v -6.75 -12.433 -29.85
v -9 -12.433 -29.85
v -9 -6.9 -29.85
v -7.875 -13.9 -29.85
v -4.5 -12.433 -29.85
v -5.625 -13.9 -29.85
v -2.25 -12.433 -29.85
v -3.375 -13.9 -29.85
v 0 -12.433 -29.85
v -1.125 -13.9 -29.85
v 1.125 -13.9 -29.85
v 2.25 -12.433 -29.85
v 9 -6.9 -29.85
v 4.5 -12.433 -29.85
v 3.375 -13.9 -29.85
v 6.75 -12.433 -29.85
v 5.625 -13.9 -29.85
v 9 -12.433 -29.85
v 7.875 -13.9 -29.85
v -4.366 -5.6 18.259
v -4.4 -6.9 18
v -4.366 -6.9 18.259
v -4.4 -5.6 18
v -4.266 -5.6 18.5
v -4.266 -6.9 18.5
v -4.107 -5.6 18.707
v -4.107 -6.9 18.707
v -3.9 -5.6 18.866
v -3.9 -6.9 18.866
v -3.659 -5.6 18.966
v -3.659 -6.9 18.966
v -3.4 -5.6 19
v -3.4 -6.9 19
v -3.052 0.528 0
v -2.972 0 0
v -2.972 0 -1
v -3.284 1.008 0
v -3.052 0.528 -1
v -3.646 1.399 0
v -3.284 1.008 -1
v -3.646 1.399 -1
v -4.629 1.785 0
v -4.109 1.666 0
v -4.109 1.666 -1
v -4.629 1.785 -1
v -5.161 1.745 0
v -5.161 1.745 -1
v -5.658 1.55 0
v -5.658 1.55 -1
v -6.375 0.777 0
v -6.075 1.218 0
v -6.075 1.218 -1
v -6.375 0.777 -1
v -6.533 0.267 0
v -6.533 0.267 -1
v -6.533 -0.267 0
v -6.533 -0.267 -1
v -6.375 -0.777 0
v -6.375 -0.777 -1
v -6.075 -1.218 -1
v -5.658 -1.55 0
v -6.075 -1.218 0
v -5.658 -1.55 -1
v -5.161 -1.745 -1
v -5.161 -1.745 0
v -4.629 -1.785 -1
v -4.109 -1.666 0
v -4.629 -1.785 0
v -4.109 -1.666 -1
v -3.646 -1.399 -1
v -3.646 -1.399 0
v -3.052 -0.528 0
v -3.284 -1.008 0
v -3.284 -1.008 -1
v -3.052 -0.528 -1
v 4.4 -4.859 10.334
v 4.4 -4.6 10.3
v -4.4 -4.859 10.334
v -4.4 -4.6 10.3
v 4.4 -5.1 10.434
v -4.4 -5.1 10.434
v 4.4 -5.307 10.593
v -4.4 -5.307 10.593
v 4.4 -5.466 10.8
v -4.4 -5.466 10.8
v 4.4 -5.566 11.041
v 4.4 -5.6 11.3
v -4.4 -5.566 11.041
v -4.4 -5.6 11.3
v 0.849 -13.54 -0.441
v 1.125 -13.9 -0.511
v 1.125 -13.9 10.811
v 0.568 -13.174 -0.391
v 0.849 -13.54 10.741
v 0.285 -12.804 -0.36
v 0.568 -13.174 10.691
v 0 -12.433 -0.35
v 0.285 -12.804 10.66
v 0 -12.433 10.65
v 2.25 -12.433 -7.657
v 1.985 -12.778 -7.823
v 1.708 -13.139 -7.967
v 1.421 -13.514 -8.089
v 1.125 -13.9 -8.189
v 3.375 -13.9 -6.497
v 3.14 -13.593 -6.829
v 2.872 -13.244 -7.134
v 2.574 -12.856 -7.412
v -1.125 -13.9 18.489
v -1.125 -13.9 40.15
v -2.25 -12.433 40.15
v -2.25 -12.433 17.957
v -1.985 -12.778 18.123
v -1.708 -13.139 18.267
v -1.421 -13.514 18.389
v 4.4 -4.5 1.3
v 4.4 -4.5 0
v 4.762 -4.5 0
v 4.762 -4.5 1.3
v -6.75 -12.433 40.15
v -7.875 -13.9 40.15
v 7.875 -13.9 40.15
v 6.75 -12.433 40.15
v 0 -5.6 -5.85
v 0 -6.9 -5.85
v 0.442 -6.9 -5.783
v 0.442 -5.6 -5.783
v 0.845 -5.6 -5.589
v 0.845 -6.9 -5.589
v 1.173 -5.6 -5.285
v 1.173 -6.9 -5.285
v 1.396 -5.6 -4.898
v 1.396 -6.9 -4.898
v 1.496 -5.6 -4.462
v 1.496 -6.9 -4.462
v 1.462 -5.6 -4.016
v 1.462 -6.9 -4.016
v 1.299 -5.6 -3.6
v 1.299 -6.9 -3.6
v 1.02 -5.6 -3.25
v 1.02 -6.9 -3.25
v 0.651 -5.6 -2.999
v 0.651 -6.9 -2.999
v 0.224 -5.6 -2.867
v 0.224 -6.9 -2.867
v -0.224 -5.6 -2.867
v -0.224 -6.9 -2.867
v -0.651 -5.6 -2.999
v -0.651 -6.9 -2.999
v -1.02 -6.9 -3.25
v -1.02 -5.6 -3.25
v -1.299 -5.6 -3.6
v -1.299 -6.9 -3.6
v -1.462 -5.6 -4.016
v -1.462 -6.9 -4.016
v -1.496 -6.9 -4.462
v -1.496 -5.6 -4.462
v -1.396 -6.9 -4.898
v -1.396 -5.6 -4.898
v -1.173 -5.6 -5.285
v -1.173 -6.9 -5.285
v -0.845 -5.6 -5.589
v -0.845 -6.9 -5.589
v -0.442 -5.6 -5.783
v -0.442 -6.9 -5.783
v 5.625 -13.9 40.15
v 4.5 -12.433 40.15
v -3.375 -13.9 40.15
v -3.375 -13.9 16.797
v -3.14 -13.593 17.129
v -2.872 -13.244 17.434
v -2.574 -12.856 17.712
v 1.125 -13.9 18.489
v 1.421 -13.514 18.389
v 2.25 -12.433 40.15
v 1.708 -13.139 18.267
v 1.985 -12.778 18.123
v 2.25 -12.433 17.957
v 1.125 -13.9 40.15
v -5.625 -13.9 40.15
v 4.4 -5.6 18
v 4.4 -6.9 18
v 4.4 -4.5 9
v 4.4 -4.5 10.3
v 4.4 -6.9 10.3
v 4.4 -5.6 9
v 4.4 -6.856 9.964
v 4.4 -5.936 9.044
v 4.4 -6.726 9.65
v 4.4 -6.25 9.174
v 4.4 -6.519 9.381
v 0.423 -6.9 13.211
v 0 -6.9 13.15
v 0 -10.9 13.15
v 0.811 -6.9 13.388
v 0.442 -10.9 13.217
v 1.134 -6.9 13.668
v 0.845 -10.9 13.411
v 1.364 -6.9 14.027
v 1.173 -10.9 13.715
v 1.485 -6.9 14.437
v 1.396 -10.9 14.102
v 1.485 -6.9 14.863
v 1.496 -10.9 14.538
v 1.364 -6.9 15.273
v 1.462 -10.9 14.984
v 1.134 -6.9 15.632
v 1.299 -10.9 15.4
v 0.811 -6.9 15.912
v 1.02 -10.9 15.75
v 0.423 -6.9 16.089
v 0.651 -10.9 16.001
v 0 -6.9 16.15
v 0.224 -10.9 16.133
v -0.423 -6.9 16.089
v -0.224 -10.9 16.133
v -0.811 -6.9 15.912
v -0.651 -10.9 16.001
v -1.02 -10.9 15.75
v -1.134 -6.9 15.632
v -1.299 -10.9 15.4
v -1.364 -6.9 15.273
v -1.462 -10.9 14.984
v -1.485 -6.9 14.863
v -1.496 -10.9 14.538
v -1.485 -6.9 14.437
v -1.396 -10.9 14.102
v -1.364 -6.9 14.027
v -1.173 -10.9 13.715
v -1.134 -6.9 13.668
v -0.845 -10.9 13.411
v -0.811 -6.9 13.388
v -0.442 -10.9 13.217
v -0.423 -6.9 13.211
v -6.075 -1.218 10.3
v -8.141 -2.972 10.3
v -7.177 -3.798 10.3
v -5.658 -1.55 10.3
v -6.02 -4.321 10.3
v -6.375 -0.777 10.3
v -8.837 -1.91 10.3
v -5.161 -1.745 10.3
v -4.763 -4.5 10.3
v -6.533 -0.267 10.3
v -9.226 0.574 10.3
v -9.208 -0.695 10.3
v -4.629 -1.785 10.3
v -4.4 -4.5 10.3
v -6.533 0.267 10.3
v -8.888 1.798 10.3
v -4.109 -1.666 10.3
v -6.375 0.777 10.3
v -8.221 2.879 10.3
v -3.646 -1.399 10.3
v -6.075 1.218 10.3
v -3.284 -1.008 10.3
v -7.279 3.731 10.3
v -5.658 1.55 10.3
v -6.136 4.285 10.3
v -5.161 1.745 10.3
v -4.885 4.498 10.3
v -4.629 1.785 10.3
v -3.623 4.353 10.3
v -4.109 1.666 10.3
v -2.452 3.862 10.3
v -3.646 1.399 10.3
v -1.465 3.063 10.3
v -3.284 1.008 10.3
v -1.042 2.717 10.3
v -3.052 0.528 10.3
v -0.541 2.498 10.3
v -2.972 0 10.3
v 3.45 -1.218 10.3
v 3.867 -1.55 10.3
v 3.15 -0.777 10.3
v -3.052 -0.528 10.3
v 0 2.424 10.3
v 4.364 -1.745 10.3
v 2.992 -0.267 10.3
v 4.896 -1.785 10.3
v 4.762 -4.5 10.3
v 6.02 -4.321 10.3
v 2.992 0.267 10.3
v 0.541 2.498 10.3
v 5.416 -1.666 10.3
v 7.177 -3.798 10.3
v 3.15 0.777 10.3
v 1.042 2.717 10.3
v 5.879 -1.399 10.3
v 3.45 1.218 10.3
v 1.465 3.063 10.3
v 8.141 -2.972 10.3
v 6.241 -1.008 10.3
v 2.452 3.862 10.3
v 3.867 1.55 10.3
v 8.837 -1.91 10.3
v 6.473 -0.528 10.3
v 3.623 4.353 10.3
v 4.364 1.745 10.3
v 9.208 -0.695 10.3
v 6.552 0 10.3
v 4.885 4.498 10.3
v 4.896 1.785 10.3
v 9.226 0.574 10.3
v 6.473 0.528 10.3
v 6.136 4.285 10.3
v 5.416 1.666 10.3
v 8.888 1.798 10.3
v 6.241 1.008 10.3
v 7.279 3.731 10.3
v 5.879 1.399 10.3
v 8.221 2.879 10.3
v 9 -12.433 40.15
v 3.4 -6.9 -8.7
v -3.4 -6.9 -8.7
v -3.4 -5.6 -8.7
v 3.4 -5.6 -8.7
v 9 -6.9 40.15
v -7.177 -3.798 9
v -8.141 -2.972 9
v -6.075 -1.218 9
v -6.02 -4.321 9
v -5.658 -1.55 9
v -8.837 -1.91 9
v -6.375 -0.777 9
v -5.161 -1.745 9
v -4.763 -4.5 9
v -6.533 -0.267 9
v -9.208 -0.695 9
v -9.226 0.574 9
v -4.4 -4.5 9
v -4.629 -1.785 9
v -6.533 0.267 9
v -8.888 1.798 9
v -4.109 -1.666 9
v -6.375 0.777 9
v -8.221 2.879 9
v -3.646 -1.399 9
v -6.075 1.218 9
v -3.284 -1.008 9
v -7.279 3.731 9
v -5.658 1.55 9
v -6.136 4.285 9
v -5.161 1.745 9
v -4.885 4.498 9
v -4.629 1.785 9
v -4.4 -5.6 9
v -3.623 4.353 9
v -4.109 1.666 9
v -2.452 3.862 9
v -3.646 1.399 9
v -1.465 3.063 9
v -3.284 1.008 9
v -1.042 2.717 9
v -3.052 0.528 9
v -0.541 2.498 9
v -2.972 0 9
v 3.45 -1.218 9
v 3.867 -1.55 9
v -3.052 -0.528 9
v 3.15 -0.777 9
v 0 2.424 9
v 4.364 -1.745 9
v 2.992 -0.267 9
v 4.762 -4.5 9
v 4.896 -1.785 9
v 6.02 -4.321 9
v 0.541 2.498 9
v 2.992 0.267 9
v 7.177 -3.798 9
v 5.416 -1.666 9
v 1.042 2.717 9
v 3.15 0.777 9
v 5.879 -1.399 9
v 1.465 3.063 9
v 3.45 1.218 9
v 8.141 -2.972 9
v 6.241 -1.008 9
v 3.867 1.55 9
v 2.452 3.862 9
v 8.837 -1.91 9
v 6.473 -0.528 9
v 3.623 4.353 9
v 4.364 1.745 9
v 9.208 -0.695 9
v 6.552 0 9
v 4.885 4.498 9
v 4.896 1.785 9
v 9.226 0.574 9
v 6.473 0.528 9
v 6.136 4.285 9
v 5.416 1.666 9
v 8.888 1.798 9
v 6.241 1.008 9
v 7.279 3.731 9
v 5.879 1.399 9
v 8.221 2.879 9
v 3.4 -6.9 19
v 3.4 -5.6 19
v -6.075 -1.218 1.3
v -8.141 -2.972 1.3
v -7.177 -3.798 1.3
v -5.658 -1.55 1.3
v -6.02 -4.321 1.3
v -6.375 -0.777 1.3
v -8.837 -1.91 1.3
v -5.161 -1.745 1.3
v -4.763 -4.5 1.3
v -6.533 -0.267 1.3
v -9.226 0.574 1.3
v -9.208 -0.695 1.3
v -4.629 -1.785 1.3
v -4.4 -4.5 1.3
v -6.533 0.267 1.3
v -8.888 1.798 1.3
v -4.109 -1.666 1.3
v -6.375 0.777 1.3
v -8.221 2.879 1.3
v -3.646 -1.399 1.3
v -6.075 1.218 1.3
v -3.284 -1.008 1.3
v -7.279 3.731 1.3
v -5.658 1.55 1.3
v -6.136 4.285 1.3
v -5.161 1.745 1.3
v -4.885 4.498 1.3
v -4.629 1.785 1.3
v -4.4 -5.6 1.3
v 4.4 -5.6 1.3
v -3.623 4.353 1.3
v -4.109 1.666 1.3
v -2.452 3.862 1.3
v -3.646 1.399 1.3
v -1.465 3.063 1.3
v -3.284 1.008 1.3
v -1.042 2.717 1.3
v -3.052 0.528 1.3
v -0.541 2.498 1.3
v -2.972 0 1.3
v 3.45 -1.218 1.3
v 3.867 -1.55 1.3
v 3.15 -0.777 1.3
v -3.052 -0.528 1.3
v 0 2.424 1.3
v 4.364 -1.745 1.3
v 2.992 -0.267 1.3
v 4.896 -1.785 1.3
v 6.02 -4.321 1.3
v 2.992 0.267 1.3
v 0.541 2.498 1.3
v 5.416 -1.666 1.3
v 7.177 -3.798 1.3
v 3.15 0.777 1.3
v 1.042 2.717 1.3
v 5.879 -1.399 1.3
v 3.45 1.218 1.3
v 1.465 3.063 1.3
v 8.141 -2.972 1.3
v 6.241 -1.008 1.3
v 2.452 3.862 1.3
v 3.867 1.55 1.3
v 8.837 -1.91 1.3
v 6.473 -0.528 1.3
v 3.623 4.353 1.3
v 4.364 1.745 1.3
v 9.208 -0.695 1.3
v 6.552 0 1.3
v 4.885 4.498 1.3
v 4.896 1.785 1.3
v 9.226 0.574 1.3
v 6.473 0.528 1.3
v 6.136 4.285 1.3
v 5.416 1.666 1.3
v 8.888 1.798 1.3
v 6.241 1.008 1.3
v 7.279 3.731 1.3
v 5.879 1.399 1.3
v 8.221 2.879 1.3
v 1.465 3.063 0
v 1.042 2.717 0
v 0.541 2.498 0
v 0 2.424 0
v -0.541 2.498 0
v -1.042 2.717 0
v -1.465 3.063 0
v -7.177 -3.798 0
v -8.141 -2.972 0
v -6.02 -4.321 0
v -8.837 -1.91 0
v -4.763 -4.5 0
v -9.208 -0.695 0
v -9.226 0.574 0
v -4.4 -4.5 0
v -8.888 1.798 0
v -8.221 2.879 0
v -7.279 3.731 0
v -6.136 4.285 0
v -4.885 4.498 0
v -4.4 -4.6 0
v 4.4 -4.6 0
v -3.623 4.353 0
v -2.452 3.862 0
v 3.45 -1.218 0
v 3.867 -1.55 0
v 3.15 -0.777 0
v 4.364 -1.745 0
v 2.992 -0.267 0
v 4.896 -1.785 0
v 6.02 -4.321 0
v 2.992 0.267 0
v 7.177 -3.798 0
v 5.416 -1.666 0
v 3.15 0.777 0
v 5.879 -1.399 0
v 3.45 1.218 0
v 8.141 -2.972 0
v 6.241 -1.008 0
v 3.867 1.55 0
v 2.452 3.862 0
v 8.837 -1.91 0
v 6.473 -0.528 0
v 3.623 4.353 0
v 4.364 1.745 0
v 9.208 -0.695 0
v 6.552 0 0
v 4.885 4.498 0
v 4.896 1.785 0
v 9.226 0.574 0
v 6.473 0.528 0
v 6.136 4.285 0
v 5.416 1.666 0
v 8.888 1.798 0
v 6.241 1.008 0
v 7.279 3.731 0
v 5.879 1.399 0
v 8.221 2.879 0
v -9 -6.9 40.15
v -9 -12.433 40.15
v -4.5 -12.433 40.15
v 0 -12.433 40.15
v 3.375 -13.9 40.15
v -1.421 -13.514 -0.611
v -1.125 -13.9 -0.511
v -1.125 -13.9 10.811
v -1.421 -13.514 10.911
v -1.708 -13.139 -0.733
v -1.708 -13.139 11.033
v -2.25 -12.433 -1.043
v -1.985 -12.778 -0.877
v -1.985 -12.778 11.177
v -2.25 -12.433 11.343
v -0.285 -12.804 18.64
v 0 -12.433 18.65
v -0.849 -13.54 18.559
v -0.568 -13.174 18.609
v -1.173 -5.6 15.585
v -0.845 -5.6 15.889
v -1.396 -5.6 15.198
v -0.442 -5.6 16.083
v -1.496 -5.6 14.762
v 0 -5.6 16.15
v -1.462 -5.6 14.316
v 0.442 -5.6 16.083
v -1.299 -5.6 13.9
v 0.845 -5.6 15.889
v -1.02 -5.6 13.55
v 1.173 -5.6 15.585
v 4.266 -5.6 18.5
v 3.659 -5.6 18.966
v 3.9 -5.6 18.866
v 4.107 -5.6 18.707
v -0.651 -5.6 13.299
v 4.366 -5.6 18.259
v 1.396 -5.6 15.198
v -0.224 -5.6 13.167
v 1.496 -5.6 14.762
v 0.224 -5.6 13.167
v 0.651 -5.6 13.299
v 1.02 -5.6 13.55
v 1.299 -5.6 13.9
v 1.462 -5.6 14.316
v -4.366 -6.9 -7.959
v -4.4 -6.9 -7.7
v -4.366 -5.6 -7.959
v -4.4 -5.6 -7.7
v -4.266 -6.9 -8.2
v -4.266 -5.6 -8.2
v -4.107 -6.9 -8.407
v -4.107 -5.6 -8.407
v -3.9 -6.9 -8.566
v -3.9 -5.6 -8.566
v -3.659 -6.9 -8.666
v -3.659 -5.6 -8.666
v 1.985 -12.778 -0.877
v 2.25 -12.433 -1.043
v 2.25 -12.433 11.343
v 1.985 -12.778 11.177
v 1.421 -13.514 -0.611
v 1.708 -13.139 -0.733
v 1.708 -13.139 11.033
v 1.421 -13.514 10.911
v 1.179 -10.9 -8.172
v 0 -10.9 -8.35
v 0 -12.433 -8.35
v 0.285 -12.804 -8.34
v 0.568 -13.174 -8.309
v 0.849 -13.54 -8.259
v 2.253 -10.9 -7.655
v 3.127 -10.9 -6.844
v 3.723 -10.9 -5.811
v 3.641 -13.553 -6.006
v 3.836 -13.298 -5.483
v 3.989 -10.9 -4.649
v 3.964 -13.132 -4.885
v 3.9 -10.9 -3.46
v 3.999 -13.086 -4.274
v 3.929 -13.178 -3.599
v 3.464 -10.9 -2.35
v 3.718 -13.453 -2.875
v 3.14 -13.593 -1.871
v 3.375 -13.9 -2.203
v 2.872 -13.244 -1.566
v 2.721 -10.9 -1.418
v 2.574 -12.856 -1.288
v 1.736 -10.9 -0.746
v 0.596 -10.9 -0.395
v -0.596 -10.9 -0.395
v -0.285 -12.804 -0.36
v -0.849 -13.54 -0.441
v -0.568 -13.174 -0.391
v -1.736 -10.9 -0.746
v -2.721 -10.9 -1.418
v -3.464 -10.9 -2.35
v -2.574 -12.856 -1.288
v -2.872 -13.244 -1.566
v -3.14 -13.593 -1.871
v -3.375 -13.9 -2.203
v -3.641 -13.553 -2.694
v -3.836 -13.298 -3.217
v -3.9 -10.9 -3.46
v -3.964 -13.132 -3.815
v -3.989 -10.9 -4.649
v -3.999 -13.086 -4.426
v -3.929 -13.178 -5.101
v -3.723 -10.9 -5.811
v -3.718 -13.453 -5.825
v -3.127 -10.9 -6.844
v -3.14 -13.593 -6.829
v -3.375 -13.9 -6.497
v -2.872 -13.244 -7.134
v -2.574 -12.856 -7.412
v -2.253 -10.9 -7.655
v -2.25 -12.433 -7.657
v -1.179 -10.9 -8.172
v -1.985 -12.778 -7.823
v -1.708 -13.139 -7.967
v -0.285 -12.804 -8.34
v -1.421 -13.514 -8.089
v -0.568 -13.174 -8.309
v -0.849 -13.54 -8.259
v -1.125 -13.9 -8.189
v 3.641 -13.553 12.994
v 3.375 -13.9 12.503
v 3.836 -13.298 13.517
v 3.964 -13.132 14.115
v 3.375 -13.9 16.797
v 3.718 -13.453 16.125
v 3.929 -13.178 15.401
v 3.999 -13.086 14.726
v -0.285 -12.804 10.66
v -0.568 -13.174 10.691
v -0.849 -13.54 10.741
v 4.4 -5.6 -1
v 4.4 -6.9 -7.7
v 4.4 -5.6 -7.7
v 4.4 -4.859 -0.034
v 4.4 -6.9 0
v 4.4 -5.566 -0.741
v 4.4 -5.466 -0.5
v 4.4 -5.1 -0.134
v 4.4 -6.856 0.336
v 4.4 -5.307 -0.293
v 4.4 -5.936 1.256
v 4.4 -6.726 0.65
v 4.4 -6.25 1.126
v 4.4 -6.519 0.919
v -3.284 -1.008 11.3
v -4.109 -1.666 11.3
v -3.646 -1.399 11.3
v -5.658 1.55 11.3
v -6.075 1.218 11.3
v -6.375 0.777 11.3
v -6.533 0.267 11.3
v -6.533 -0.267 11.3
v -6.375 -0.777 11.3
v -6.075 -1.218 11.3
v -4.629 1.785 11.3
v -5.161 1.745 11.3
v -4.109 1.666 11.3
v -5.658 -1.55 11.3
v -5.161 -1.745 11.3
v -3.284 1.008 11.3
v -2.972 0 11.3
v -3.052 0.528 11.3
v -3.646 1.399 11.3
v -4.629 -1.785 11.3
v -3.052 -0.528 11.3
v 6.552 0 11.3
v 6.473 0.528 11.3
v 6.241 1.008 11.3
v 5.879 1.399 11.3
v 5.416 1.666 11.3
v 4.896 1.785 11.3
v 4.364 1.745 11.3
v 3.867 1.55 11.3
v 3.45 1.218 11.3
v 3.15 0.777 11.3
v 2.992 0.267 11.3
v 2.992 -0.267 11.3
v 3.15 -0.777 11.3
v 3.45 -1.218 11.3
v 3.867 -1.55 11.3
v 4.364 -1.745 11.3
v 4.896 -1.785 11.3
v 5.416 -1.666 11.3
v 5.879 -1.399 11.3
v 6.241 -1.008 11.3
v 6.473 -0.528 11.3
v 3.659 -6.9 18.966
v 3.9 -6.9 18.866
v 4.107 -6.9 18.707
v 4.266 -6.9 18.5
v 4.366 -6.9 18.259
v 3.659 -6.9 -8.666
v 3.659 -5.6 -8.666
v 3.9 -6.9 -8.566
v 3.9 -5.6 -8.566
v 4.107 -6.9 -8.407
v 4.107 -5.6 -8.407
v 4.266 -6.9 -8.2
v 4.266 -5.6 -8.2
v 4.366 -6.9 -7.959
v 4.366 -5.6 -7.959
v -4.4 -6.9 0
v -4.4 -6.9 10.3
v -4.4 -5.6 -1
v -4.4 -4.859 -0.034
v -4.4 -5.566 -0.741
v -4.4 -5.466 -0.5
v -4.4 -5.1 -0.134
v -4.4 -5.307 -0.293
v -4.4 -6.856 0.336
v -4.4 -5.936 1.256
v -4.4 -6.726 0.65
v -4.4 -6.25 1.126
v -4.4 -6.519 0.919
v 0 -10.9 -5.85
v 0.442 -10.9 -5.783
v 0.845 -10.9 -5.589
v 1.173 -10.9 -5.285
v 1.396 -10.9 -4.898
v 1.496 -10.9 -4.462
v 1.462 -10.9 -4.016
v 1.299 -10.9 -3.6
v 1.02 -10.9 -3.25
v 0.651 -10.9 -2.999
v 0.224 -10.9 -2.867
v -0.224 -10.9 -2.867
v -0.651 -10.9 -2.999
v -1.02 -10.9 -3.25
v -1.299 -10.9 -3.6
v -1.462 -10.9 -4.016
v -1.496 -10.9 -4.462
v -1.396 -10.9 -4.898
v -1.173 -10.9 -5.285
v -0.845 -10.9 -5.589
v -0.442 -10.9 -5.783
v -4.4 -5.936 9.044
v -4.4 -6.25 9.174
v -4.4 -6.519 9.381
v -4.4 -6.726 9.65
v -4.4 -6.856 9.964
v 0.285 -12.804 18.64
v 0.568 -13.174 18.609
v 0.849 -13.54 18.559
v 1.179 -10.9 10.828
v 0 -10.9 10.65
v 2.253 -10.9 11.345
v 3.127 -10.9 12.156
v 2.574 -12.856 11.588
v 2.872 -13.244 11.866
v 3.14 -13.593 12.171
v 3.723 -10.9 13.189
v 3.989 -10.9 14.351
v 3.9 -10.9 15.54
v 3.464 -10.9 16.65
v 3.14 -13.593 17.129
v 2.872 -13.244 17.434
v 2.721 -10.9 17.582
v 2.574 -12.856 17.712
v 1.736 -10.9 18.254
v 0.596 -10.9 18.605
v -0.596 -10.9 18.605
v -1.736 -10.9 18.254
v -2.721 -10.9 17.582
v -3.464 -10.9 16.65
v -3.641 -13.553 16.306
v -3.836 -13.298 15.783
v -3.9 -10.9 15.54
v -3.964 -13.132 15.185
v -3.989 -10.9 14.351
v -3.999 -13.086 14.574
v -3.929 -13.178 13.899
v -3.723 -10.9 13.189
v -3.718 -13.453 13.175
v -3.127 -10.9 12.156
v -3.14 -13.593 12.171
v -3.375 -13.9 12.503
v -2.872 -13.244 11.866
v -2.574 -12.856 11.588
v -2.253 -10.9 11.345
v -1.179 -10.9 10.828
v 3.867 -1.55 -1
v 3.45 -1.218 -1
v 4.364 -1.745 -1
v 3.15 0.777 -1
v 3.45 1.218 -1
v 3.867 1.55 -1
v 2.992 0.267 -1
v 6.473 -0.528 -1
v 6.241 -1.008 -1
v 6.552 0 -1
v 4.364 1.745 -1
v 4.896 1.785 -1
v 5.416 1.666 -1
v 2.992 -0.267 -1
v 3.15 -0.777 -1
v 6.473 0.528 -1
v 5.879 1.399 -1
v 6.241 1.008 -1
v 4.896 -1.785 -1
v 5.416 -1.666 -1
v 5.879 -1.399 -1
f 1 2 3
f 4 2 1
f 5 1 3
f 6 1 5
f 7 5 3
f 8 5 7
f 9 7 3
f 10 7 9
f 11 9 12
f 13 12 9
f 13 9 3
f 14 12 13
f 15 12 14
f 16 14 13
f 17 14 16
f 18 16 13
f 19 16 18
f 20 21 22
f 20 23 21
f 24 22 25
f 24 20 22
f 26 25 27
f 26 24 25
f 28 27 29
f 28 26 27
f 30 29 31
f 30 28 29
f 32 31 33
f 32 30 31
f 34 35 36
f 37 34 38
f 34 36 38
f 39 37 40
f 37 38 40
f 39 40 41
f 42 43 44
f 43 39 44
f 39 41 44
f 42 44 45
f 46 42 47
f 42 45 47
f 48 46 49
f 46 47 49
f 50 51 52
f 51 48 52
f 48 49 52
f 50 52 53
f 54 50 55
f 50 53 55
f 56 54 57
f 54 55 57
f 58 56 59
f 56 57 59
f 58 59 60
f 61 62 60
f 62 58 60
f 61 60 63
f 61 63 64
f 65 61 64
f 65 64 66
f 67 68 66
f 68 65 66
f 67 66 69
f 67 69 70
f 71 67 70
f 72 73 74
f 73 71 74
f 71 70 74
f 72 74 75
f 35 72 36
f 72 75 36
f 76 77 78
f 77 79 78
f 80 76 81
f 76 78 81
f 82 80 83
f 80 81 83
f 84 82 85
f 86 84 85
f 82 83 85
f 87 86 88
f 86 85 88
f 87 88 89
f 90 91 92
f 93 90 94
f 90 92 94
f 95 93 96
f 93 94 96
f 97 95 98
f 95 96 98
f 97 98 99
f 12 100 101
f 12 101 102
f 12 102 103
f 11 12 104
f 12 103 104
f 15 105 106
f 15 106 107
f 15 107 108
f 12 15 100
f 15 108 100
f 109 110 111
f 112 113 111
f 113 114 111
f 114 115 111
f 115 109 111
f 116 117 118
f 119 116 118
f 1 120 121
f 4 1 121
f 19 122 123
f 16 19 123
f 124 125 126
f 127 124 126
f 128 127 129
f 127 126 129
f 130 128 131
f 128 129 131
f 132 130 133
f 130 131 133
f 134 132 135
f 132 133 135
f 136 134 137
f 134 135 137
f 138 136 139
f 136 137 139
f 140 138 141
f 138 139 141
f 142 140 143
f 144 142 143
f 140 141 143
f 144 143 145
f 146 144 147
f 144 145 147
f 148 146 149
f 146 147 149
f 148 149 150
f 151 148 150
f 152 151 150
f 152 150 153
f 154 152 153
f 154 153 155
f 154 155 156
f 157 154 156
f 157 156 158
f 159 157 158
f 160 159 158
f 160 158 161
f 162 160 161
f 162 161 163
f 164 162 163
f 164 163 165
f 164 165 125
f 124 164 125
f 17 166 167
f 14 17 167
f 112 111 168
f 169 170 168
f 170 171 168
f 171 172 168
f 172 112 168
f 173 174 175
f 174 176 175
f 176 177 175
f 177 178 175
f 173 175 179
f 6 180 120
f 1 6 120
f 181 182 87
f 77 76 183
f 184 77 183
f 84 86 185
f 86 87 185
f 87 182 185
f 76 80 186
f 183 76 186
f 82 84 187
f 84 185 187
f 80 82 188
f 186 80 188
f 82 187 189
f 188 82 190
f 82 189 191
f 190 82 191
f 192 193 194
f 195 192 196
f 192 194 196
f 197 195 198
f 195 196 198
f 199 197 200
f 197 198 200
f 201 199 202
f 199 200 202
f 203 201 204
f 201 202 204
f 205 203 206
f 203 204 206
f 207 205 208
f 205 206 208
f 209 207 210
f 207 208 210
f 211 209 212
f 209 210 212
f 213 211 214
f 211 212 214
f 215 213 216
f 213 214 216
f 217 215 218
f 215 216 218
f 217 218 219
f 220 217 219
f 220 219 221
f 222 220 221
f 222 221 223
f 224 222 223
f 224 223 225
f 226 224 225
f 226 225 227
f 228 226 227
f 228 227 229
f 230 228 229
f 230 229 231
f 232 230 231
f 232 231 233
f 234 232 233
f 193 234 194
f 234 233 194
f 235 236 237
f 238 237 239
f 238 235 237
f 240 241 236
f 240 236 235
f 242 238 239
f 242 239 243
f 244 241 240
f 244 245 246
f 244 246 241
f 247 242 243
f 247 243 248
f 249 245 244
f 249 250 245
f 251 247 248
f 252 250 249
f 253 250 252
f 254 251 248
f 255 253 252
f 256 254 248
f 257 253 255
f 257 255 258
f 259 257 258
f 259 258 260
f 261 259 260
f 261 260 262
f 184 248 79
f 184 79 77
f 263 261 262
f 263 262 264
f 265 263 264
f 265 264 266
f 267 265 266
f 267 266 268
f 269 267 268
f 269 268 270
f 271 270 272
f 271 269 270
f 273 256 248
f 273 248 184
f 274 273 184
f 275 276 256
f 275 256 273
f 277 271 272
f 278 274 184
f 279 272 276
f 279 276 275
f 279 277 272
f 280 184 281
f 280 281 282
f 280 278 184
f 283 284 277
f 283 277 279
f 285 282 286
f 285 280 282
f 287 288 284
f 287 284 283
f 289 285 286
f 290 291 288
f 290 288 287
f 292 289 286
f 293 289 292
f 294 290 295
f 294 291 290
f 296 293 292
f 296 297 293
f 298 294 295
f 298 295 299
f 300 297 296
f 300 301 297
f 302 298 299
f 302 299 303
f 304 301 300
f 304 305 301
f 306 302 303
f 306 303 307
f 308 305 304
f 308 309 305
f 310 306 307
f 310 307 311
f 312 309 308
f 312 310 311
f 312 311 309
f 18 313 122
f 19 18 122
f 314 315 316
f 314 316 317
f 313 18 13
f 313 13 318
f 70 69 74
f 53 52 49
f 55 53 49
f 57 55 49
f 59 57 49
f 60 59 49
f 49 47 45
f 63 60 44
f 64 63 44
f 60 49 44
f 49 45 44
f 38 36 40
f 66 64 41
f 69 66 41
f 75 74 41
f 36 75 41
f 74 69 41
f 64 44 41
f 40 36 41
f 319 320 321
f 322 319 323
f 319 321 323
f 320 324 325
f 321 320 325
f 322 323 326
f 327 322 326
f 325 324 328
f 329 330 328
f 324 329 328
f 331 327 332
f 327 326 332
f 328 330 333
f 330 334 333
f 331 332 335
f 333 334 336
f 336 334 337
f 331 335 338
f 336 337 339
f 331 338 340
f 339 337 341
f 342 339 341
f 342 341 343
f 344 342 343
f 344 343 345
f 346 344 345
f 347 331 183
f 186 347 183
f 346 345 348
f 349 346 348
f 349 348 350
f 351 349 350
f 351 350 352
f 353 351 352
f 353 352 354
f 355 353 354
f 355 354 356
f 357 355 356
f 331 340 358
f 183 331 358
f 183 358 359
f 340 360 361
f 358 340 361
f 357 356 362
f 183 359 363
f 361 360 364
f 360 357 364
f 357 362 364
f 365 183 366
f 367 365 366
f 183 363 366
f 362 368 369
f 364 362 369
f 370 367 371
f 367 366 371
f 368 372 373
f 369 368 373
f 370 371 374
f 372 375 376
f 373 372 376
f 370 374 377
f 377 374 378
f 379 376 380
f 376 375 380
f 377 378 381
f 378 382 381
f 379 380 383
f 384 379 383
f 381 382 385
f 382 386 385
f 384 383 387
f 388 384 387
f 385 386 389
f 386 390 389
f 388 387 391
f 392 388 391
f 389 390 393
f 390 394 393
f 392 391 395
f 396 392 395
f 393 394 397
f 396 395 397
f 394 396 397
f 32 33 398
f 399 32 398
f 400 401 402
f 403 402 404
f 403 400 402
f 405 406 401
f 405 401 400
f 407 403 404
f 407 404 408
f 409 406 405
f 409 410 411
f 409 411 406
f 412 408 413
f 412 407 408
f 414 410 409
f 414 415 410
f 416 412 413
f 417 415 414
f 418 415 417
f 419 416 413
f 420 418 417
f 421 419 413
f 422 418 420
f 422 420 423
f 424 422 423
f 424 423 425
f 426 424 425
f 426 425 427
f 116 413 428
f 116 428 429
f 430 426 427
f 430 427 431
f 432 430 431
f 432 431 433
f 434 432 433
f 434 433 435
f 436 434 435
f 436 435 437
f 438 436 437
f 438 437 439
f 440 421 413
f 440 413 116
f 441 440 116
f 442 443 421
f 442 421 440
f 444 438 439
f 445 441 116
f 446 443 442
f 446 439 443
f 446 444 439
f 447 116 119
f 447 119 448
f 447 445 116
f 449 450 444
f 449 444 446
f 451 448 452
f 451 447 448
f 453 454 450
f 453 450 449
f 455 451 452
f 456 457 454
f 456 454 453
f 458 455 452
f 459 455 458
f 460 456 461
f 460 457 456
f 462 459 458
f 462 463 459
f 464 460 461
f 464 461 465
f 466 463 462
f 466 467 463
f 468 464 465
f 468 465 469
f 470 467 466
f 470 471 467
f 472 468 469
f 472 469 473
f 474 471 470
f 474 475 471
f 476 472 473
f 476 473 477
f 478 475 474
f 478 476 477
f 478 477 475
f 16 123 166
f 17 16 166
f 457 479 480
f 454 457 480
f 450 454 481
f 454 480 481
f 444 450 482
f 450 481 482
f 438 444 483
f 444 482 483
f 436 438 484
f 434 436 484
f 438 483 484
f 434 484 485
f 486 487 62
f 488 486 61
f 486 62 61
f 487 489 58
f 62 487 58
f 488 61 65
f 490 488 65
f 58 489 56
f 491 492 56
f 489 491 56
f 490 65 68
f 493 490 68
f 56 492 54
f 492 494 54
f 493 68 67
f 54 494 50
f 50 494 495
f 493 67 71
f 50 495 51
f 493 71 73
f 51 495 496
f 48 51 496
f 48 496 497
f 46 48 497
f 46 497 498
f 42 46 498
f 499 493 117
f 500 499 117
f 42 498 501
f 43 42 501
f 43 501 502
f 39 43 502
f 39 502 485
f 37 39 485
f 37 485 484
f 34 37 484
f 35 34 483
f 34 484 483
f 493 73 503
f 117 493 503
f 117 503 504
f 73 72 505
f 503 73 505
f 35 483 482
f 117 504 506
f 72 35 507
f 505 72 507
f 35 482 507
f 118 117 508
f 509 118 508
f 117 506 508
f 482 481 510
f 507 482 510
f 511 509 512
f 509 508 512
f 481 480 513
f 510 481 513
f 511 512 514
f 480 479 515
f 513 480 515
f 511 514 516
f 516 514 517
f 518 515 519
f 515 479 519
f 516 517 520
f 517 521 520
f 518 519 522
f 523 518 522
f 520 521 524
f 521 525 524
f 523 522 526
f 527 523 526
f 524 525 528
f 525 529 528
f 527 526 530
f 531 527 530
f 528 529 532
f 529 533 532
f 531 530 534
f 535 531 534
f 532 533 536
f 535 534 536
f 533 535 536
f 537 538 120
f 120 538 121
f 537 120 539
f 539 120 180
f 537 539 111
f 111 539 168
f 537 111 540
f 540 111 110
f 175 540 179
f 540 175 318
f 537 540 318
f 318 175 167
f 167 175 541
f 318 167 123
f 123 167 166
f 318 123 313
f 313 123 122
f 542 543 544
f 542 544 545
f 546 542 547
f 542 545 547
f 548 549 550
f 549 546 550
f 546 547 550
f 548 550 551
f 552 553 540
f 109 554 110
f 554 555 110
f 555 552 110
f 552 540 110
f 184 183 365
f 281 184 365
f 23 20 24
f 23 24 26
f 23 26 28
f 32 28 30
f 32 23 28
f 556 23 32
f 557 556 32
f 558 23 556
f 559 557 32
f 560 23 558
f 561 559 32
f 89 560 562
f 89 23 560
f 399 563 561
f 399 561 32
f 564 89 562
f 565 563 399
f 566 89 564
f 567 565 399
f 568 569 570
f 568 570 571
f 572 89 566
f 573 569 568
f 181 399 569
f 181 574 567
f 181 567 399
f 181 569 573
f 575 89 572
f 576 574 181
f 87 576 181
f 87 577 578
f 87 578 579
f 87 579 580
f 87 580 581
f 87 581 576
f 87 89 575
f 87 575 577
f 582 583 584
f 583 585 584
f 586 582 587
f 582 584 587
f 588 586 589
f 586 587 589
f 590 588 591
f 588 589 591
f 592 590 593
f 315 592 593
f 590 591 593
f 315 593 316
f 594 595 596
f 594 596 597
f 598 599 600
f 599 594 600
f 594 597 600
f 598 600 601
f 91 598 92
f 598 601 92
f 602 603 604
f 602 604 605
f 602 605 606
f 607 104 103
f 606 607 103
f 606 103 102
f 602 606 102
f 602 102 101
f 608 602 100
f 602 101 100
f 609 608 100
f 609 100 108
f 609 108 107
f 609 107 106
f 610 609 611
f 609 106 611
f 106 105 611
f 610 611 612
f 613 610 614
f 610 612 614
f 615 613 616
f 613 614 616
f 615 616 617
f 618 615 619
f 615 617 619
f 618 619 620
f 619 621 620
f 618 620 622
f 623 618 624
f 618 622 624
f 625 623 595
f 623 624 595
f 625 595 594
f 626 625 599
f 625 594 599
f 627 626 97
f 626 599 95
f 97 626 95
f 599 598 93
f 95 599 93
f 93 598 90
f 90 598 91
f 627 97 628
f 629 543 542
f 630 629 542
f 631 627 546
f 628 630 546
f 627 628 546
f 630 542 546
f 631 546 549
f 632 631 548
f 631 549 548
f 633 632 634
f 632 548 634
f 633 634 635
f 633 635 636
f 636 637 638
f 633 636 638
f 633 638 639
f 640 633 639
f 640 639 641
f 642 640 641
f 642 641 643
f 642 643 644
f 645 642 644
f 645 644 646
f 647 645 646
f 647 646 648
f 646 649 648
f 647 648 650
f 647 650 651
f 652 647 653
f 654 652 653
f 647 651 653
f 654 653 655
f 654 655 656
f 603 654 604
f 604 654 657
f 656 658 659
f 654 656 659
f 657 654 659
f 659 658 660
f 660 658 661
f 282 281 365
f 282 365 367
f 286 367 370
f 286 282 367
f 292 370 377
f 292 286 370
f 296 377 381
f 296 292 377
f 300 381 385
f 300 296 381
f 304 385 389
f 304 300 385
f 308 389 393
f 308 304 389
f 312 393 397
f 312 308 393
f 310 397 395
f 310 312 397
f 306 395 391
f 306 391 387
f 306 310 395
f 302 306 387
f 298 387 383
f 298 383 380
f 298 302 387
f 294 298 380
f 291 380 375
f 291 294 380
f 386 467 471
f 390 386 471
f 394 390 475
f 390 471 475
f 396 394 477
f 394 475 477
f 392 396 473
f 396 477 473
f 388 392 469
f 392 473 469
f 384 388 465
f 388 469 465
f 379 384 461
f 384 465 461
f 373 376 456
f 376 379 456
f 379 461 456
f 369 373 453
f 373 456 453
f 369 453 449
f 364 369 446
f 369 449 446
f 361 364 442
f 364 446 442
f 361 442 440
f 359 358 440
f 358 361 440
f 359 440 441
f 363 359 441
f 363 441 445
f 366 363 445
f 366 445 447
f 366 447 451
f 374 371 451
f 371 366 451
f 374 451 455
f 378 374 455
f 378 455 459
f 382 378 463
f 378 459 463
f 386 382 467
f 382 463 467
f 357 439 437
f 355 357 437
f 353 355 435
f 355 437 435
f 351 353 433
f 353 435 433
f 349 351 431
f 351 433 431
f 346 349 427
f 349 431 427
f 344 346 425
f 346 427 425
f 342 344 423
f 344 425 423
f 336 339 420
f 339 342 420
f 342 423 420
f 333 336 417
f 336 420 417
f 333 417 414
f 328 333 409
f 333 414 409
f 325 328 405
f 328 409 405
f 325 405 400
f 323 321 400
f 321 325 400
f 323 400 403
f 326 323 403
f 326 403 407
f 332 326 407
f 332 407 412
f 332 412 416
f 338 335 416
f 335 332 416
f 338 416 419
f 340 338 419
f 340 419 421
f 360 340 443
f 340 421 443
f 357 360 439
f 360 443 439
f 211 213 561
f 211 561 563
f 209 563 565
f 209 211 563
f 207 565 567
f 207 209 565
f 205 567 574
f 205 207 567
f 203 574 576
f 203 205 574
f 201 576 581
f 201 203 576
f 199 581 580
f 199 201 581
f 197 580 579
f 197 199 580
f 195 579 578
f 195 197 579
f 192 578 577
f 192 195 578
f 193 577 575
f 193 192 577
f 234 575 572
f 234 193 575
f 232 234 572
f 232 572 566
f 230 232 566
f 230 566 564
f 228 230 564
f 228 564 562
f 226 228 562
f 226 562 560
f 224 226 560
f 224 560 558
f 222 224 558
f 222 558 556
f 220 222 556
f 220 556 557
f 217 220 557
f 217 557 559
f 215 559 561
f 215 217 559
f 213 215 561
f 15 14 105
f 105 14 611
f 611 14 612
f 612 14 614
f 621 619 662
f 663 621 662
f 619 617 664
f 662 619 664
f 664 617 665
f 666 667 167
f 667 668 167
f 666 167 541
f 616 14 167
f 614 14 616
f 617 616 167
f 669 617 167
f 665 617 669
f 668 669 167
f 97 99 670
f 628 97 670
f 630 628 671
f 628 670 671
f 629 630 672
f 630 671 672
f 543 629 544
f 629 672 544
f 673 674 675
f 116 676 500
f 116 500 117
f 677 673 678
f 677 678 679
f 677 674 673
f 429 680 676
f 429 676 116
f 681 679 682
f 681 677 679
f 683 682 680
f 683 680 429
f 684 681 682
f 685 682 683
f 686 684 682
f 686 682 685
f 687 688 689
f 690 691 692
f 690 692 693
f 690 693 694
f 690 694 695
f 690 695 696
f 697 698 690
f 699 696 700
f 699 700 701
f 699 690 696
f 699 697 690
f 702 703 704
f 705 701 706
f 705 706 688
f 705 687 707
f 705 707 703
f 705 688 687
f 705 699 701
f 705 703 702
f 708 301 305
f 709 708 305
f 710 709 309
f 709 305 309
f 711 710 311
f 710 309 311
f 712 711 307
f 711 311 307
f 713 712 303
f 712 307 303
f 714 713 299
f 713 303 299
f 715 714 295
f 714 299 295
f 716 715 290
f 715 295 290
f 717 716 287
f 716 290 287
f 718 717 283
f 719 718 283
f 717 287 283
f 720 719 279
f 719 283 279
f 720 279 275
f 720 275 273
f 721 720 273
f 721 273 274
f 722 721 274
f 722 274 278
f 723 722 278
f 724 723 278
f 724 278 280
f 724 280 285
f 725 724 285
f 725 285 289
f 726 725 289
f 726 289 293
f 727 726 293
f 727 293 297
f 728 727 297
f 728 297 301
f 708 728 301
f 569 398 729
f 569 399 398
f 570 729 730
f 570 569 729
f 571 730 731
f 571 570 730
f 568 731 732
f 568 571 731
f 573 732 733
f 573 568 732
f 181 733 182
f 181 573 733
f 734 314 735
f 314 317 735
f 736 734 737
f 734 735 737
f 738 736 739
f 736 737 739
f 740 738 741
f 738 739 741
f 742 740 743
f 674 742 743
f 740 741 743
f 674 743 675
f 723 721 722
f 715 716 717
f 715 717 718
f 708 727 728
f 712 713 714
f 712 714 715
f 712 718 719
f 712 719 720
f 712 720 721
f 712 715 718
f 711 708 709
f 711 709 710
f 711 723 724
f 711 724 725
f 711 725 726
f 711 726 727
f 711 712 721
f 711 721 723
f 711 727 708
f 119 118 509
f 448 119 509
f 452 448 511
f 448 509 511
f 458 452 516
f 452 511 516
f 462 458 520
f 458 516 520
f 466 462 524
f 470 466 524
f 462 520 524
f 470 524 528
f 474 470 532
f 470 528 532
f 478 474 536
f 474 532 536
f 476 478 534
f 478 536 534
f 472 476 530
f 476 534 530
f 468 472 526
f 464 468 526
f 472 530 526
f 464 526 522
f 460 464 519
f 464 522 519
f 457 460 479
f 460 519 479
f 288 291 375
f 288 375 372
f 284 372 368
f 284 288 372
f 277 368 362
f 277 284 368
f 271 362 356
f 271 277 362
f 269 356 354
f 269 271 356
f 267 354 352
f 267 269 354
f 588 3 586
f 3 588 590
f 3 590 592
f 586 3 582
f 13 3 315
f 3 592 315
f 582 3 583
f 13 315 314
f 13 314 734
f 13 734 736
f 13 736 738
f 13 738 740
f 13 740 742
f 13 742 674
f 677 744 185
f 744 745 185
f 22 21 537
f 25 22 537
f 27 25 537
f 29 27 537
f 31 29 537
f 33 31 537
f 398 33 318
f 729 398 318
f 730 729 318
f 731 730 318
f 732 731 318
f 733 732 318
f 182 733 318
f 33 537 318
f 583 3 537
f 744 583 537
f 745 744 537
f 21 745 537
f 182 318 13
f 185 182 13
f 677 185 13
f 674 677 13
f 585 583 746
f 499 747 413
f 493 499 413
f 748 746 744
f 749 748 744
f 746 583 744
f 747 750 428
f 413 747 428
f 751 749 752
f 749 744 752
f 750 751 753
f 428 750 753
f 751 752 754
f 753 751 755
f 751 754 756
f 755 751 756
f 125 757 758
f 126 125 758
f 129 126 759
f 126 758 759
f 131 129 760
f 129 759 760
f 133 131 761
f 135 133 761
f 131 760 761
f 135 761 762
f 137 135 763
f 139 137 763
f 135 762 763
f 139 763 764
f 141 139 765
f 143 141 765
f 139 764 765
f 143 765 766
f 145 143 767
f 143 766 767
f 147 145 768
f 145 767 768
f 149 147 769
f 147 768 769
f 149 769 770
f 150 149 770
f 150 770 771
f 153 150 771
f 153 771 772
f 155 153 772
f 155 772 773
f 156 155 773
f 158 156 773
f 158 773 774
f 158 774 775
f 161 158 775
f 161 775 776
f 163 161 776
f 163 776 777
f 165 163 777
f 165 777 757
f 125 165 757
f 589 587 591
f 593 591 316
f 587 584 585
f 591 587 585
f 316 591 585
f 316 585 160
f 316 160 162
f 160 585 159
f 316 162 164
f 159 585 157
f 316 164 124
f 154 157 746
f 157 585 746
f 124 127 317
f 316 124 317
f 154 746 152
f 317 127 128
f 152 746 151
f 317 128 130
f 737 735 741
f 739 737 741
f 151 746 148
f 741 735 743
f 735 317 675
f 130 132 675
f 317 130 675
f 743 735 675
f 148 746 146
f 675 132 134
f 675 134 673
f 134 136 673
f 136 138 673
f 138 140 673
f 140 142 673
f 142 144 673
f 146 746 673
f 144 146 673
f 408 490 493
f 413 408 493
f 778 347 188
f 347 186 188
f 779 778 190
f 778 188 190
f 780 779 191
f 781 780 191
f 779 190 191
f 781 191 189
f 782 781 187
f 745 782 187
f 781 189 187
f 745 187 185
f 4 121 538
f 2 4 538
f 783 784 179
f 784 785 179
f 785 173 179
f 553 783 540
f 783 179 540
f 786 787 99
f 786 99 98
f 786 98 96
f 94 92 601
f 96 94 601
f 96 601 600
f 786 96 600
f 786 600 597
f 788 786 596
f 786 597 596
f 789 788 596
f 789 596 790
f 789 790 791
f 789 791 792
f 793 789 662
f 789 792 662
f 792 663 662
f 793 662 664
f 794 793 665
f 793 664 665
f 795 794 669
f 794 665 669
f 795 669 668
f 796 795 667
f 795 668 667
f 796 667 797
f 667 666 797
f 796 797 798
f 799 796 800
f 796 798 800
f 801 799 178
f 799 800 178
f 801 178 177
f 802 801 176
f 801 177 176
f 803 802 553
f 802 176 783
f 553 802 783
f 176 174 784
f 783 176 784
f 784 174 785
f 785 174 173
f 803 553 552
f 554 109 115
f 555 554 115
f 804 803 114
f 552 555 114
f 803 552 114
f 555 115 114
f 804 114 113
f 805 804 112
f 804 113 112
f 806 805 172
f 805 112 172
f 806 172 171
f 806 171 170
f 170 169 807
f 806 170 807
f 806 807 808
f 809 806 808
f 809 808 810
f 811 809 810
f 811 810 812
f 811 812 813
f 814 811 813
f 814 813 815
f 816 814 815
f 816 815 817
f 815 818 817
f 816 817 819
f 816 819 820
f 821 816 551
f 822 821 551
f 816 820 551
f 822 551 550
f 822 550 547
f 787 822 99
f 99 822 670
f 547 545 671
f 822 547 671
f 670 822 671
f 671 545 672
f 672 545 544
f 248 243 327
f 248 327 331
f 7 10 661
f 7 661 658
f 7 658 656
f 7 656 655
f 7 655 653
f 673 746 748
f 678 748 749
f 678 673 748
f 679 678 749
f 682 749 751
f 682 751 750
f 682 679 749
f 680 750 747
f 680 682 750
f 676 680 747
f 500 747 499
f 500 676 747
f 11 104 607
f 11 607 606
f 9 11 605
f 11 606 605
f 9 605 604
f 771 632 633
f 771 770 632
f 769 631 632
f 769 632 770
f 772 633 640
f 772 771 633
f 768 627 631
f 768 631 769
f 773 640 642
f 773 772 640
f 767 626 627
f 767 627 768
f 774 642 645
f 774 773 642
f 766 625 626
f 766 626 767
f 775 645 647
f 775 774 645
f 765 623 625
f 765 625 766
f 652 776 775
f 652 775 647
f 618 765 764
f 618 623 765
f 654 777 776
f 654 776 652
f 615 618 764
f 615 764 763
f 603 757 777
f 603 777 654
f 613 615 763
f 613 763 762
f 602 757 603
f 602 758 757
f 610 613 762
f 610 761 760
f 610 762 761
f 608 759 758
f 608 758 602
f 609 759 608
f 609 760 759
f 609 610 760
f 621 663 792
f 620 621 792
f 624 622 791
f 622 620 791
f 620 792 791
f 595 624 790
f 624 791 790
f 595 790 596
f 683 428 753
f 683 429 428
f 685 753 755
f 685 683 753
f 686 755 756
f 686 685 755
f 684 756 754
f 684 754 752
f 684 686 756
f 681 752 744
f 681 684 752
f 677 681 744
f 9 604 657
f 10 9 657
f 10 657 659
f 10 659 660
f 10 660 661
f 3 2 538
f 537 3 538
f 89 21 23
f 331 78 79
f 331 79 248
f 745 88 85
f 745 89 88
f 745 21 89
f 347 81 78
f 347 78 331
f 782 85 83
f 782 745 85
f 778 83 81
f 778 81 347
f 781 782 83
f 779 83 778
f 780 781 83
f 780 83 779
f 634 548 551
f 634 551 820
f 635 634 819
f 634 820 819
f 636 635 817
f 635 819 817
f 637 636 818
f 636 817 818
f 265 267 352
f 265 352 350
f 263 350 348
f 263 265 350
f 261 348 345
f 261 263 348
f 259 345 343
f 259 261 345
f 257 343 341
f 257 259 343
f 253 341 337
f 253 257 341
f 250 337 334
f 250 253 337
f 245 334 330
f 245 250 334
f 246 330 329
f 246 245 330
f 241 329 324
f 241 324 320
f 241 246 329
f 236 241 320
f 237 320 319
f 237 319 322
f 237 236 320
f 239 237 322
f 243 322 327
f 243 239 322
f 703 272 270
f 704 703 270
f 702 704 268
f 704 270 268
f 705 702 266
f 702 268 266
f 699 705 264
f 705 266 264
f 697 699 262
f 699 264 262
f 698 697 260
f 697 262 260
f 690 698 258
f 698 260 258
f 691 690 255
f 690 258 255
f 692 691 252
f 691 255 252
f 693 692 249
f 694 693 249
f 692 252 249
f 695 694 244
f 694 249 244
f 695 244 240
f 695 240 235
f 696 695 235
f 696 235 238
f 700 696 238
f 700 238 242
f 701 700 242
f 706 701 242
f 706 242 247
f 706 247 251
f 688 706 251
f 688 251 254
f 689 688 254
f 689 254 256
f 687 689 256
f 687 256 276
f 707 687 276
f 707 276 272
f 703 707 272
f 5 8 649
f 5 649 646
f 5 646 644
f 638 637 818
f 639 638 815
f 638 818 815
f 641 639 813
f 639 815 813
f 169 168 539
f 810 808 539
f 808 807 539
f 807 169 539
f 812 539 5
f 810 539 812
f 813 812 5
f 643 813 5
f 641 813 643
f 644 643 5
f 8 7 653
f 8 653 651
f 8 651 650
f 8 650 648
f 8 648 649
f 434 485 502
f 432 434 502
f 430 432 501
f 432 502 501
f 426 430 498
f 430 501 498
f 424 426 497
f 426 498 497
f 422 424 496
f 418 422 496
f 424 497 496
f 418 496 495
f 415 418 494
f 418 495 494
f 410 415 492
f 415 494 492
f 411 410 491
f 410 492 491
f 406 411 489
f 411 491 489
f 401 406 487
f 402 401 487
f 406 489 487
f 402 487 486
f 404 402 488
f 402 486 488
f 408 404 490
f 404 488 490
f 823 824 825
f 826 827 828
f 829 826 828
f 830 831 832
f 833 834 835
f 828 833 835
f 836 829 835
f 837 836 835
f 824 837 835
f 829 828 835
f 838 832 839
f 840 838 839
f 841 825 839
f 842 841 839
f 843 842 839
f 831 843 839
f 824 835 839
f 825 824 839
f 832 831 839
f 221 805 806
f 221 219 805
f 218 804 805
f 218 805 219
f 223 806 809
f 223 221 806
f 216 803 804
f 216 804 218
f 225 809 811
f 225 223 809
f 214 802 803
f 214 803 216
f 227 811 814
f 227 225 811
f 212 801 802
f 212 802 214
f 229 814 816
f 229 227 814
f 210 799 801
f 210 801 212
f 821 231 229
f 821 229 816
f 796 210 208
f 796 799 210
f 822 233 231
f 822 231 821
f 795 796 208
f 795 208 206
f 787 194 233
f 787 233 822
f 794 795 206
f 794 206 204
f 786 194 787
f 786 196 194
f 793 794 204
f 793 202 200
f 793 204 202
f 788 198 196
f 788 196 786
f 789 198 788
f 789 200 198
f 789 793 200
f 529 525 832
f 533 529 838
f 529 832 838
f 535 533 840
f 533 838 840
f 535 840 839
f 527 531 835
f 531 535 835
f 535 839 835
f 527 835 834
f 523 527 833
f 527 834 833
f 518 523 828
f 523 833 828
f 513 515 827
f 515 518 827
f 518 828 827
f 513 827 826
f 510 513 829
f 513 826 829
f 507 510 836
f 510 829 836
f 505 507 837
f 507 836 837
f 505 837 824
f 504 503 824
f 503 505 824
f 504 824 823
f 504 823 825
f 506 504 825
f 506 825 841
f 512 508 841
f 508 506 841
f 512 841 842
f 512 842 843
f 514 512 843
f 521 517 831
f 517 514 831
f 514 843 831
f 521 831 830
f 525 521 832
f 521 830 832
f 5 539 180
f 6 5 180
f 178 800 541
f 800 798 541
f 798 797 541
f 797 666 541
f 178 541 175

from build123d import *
from build123d.topology import SkipClean

# Parameters (mm, degrees)
BOSS_EXTRUDE1_DEPTH      = 1.3
BOSS_EXTRUDE2_DEPTH      = 10
BOSS_EXTRUDE2_DEPTH_BACK = 2.3
SKETCH2_R                = 1.79
SKETCH4_W                = 8.8
SKETCH4_H                = 1.3
BOSS_EXTRUDE4_DEPTH      = 2.4
SKETCH3_W                = 8.8
SKETCH3_H                = 10
BOSS_EXTRUDE3_DEPTH      = 1.3
FILLET4_R                = 1.3
FILLET6_R                = 1
SKETCH5_R                = 1.5
CUT_EXTRUDE1_DEPTH       = 2.4
FILLET7_R                = 1
FILLET4_OF_MIRROR1_R     = 1.3
FILLET6_OF_MIRROR1_R     = 1
FILLET7_OF_MIRROR1_R     = 1
BOSS_EXTRUDE5_START      = 7
SKETCH6_W                = 18
SKETCH6_H                = 70
SKETCH6_R                = 1.5
BOSS_EXTRUDE5_DEPTH      = 7
SKETCH9_R                = 4
CUT_EXTRUDE3_DEPTH       = 3
CUT_EXTRUDE4_DEPTH       = 72.965296541


with BuildPart() as part:
    # Sketch1 → Boss-Extrude1 (new body)
    with BuildSketch(Plane.XY):
        with BuildLine():
            Line((-4.7625, -4.5), (4.7625, -4.5))
            ThreePointArc((4.7625, -4.5), (8.887505516, 1.798424168), (1.465384615, 3.062520227))
            ThreePointArc((1.465384615, 3.062520227), (0, 2.423640328), (-1.465384615, 3.062520227))
            ThreePointArc((-1.465384615, 3.062520227), (-8.887505516, 1.798424168), (-4.7625, -4.5))
        make_face()
    boss_extrude1 = extrude(amount=BOSS_EXTRUDE1_DEPTH)

    # Sketch2 → Boss-Extrude2 (add, two sides: drawn at the far end of the back side and taken through both)
    with BuildSketch(Plane.XY.offset(1.3).offset(-BOSS_EXTRUDE2_DEPTH_BACK)):
        with Locations((-4.7625, 0)):
            Circle(SKETCH2_R)
        with Locations((4.7625, 0)):
            Circle(SKETCH2_R)
    extrude(amount=BOSS_EXTRUDE2_DEPTH + BOSS_EXTRUDE2_DEPTH_BACK)

    # Sketch4 → Boss-Extrude4 (add)
    with BuildSketch(Plane.XZ.offset(4.5)):
        with Locations((0, 0.65)):
            Rectangle(SKETCH4_W, SKETCH4_H)
    boss_extrude4 = extrude(amount=BOSS_EXTRUDE4_DEPTH)

    # Sketch3 → Boss-Extrude3 (add)
    with BuildSketch(Plane.XZ.offset(6.9)):
        with Locations((0, -3.7)):
            Rectangle(SKETCH3_W, SKETCH3_H)
    boss_extrude3 = extrude(amount=-BOSS_EXTRUDE3_DEPTH)

    # Fillet4
    fillet4_edges = [part.edges().sort_by_distance(p)[0] for p in [
        (0, -6.9, 1.3),
    ]]
    fillet(fillet4_edges, radius=FILLET4_R)

    # Fillet6
    fillet6_edges = [part.edges().sort_by_distance(p)[0] for p in [
        (0, -5.6, 0),
    ]]
    fillet(fillet6_edges, radius=FILLET6_R)

    # Sketch5 → Cut-Extrude1 (cut)
    with BuildSketch(Plane.XZ.offset(6.9)):
        with Locations(Location((0, -4.35, 0), (0, 0, 270))):
            Circle(SKETCH5_R)
    cut_extrude1 = extrude(amount=-CUT_EXTRUDE1_DEPTH, mode=Mode.SUBTRACT)

    # Fillet7
    fillet7_edges = [part.edges().sort_by_distance(p)[0] for p in [
        (-4.4, -6.25, -8.7),
        (4.4, -6.25, -8.7),
    ]]
    fillet(fillet7_edges, radius=FILLET7_R)

    # Mirror1: Boss-Extrude1, Boss-Extrude4, Boss-Extrude3, Cut-Extrude1 across plane
    add(boss_extrude1.mirror(Plane(origin=(0, 0, 5.15), x_dir=(1, 0, 0), z_dir=(0, 0, -1))))
    add(boss_extrude4.mirror(Plane(origin=(0, 0, 5.15), x_dir=(1, 0, 0), z_dir=(0, 0, -1))))
    add(boss_extrude3.mirror(Plane(origin=(0, 0, 5.15), x_dir=(1, 0, 0), z_dir=(0, 0, -1))))
    add(cut_extrude1.mirror(Plane(origin=(0, 0, 5.15), x_dir=(1, 0, 0), z_dir=(0, 0, -1))), mode=Mode.SUBTRACT)

    # Fillet4 of Mirror1
    fillet4_of_mirror1_edges = [part.edges().sort_by_distance(p)[0] for p in [
        (0, -6.9, 9),
    ]]
    fillet(fillet4_of_mirror1_edges, radius=FILLET4_OF_MIRROR1_R)

    # Fillet6 of Mirror1
    fillet6_of_mirror1_edges = [part.edges().sort_by_distance(p)[0] for p in [
        (0, -5.6, 10.3),
    ]]
    fillet(fillet6_of_mirror1_edges, radius=FILLET6_OF_MIRROR1_R)

    # Fillet7 of Mirror1
    fillet7_of_mirror1_edges = [part.edges().sort_by_distance(p)[0] for p in [
        (-4.4, -6.25, 19),
        (4.4, -6.25, 19),
    ]]
    fillet(fillet7_of_mirror1_edges, radius=FILLET7_OF_MIRROR1_R)

    # Sketch6 → Boss-Extrude5 (add)
    with SkipClean():  # the faces are left unmerged after this step: merging them gives an invalid solid
        with BuildSketch(Plane.XZ.offset(6.9).offset(BOSS_EXTRUDE5_START)):
            with Locations((0, 5.15)):
                Rectangle(SKETCH6_W, SKETCH6_H)
            with Locations(Location((0, 14.65, 0), (0, 0, 270))):
                Circle(SKETCH6_R, mode=Mode.SUBTRACT)
            with Locations(Location((0, -4.35, 0), (0, 0, 270))):
                Circle(SKETCH6_R, mode=Mode.SUBTRACT)
        extrude(amount=-BOSS_EXTRUDE5_DEPTH)

    # Sketch9 → Cut-Extrude3 (cut)
    with SkipClean():  # the faces are left unmerged after this step: merging them gives an invalid solid
        with BuildSketch(Plane.XZ.offset(13.9)):
            with Locations(Location((0, 14.65, 0), (0, 0, 270))):
                Circle(SKETCH9_R)
            with Locations(Location((0, -4.35, 0), (0, 0, 270))):
                Circle(SKETCH9_R)
        extrude(amount=-CUT_EXTRUDE3_DEPTH, mode=Mode.SUBTRACT)

    # Sketch11 → Cut-Extrude4 (cut, through all)
    with SkipClean():  # the faces are left unmerged after this step: merging them gives an invalid solid
        with BuildSketch(Plane.XY.offset(40.15)):
            Polygon((9, -12.432975638), (7.875, -13.9), (6.75, -12.432975638), (5.625, -13.9), (4.5, -12.432975638), (3.375, -13.9), (2.25, -12.432975638), (1.125, -13.9), (0, -12.432975638), (-1.125, -13.9), (-2.25, -12.432975638), (-3.375, -13.9), (-4.5, -12.432975638), (-5.625, -13.9), (-6.75, -12.432975638), (-7.875, -13.9), (-9, -12.432975638), (-9, -14.9), (9, -14.9), align=None)
        extrude(amount=-CUT_EXTRUDE4_DEPTH, mode=Mode.SUBTRACT)


solid = part.part
